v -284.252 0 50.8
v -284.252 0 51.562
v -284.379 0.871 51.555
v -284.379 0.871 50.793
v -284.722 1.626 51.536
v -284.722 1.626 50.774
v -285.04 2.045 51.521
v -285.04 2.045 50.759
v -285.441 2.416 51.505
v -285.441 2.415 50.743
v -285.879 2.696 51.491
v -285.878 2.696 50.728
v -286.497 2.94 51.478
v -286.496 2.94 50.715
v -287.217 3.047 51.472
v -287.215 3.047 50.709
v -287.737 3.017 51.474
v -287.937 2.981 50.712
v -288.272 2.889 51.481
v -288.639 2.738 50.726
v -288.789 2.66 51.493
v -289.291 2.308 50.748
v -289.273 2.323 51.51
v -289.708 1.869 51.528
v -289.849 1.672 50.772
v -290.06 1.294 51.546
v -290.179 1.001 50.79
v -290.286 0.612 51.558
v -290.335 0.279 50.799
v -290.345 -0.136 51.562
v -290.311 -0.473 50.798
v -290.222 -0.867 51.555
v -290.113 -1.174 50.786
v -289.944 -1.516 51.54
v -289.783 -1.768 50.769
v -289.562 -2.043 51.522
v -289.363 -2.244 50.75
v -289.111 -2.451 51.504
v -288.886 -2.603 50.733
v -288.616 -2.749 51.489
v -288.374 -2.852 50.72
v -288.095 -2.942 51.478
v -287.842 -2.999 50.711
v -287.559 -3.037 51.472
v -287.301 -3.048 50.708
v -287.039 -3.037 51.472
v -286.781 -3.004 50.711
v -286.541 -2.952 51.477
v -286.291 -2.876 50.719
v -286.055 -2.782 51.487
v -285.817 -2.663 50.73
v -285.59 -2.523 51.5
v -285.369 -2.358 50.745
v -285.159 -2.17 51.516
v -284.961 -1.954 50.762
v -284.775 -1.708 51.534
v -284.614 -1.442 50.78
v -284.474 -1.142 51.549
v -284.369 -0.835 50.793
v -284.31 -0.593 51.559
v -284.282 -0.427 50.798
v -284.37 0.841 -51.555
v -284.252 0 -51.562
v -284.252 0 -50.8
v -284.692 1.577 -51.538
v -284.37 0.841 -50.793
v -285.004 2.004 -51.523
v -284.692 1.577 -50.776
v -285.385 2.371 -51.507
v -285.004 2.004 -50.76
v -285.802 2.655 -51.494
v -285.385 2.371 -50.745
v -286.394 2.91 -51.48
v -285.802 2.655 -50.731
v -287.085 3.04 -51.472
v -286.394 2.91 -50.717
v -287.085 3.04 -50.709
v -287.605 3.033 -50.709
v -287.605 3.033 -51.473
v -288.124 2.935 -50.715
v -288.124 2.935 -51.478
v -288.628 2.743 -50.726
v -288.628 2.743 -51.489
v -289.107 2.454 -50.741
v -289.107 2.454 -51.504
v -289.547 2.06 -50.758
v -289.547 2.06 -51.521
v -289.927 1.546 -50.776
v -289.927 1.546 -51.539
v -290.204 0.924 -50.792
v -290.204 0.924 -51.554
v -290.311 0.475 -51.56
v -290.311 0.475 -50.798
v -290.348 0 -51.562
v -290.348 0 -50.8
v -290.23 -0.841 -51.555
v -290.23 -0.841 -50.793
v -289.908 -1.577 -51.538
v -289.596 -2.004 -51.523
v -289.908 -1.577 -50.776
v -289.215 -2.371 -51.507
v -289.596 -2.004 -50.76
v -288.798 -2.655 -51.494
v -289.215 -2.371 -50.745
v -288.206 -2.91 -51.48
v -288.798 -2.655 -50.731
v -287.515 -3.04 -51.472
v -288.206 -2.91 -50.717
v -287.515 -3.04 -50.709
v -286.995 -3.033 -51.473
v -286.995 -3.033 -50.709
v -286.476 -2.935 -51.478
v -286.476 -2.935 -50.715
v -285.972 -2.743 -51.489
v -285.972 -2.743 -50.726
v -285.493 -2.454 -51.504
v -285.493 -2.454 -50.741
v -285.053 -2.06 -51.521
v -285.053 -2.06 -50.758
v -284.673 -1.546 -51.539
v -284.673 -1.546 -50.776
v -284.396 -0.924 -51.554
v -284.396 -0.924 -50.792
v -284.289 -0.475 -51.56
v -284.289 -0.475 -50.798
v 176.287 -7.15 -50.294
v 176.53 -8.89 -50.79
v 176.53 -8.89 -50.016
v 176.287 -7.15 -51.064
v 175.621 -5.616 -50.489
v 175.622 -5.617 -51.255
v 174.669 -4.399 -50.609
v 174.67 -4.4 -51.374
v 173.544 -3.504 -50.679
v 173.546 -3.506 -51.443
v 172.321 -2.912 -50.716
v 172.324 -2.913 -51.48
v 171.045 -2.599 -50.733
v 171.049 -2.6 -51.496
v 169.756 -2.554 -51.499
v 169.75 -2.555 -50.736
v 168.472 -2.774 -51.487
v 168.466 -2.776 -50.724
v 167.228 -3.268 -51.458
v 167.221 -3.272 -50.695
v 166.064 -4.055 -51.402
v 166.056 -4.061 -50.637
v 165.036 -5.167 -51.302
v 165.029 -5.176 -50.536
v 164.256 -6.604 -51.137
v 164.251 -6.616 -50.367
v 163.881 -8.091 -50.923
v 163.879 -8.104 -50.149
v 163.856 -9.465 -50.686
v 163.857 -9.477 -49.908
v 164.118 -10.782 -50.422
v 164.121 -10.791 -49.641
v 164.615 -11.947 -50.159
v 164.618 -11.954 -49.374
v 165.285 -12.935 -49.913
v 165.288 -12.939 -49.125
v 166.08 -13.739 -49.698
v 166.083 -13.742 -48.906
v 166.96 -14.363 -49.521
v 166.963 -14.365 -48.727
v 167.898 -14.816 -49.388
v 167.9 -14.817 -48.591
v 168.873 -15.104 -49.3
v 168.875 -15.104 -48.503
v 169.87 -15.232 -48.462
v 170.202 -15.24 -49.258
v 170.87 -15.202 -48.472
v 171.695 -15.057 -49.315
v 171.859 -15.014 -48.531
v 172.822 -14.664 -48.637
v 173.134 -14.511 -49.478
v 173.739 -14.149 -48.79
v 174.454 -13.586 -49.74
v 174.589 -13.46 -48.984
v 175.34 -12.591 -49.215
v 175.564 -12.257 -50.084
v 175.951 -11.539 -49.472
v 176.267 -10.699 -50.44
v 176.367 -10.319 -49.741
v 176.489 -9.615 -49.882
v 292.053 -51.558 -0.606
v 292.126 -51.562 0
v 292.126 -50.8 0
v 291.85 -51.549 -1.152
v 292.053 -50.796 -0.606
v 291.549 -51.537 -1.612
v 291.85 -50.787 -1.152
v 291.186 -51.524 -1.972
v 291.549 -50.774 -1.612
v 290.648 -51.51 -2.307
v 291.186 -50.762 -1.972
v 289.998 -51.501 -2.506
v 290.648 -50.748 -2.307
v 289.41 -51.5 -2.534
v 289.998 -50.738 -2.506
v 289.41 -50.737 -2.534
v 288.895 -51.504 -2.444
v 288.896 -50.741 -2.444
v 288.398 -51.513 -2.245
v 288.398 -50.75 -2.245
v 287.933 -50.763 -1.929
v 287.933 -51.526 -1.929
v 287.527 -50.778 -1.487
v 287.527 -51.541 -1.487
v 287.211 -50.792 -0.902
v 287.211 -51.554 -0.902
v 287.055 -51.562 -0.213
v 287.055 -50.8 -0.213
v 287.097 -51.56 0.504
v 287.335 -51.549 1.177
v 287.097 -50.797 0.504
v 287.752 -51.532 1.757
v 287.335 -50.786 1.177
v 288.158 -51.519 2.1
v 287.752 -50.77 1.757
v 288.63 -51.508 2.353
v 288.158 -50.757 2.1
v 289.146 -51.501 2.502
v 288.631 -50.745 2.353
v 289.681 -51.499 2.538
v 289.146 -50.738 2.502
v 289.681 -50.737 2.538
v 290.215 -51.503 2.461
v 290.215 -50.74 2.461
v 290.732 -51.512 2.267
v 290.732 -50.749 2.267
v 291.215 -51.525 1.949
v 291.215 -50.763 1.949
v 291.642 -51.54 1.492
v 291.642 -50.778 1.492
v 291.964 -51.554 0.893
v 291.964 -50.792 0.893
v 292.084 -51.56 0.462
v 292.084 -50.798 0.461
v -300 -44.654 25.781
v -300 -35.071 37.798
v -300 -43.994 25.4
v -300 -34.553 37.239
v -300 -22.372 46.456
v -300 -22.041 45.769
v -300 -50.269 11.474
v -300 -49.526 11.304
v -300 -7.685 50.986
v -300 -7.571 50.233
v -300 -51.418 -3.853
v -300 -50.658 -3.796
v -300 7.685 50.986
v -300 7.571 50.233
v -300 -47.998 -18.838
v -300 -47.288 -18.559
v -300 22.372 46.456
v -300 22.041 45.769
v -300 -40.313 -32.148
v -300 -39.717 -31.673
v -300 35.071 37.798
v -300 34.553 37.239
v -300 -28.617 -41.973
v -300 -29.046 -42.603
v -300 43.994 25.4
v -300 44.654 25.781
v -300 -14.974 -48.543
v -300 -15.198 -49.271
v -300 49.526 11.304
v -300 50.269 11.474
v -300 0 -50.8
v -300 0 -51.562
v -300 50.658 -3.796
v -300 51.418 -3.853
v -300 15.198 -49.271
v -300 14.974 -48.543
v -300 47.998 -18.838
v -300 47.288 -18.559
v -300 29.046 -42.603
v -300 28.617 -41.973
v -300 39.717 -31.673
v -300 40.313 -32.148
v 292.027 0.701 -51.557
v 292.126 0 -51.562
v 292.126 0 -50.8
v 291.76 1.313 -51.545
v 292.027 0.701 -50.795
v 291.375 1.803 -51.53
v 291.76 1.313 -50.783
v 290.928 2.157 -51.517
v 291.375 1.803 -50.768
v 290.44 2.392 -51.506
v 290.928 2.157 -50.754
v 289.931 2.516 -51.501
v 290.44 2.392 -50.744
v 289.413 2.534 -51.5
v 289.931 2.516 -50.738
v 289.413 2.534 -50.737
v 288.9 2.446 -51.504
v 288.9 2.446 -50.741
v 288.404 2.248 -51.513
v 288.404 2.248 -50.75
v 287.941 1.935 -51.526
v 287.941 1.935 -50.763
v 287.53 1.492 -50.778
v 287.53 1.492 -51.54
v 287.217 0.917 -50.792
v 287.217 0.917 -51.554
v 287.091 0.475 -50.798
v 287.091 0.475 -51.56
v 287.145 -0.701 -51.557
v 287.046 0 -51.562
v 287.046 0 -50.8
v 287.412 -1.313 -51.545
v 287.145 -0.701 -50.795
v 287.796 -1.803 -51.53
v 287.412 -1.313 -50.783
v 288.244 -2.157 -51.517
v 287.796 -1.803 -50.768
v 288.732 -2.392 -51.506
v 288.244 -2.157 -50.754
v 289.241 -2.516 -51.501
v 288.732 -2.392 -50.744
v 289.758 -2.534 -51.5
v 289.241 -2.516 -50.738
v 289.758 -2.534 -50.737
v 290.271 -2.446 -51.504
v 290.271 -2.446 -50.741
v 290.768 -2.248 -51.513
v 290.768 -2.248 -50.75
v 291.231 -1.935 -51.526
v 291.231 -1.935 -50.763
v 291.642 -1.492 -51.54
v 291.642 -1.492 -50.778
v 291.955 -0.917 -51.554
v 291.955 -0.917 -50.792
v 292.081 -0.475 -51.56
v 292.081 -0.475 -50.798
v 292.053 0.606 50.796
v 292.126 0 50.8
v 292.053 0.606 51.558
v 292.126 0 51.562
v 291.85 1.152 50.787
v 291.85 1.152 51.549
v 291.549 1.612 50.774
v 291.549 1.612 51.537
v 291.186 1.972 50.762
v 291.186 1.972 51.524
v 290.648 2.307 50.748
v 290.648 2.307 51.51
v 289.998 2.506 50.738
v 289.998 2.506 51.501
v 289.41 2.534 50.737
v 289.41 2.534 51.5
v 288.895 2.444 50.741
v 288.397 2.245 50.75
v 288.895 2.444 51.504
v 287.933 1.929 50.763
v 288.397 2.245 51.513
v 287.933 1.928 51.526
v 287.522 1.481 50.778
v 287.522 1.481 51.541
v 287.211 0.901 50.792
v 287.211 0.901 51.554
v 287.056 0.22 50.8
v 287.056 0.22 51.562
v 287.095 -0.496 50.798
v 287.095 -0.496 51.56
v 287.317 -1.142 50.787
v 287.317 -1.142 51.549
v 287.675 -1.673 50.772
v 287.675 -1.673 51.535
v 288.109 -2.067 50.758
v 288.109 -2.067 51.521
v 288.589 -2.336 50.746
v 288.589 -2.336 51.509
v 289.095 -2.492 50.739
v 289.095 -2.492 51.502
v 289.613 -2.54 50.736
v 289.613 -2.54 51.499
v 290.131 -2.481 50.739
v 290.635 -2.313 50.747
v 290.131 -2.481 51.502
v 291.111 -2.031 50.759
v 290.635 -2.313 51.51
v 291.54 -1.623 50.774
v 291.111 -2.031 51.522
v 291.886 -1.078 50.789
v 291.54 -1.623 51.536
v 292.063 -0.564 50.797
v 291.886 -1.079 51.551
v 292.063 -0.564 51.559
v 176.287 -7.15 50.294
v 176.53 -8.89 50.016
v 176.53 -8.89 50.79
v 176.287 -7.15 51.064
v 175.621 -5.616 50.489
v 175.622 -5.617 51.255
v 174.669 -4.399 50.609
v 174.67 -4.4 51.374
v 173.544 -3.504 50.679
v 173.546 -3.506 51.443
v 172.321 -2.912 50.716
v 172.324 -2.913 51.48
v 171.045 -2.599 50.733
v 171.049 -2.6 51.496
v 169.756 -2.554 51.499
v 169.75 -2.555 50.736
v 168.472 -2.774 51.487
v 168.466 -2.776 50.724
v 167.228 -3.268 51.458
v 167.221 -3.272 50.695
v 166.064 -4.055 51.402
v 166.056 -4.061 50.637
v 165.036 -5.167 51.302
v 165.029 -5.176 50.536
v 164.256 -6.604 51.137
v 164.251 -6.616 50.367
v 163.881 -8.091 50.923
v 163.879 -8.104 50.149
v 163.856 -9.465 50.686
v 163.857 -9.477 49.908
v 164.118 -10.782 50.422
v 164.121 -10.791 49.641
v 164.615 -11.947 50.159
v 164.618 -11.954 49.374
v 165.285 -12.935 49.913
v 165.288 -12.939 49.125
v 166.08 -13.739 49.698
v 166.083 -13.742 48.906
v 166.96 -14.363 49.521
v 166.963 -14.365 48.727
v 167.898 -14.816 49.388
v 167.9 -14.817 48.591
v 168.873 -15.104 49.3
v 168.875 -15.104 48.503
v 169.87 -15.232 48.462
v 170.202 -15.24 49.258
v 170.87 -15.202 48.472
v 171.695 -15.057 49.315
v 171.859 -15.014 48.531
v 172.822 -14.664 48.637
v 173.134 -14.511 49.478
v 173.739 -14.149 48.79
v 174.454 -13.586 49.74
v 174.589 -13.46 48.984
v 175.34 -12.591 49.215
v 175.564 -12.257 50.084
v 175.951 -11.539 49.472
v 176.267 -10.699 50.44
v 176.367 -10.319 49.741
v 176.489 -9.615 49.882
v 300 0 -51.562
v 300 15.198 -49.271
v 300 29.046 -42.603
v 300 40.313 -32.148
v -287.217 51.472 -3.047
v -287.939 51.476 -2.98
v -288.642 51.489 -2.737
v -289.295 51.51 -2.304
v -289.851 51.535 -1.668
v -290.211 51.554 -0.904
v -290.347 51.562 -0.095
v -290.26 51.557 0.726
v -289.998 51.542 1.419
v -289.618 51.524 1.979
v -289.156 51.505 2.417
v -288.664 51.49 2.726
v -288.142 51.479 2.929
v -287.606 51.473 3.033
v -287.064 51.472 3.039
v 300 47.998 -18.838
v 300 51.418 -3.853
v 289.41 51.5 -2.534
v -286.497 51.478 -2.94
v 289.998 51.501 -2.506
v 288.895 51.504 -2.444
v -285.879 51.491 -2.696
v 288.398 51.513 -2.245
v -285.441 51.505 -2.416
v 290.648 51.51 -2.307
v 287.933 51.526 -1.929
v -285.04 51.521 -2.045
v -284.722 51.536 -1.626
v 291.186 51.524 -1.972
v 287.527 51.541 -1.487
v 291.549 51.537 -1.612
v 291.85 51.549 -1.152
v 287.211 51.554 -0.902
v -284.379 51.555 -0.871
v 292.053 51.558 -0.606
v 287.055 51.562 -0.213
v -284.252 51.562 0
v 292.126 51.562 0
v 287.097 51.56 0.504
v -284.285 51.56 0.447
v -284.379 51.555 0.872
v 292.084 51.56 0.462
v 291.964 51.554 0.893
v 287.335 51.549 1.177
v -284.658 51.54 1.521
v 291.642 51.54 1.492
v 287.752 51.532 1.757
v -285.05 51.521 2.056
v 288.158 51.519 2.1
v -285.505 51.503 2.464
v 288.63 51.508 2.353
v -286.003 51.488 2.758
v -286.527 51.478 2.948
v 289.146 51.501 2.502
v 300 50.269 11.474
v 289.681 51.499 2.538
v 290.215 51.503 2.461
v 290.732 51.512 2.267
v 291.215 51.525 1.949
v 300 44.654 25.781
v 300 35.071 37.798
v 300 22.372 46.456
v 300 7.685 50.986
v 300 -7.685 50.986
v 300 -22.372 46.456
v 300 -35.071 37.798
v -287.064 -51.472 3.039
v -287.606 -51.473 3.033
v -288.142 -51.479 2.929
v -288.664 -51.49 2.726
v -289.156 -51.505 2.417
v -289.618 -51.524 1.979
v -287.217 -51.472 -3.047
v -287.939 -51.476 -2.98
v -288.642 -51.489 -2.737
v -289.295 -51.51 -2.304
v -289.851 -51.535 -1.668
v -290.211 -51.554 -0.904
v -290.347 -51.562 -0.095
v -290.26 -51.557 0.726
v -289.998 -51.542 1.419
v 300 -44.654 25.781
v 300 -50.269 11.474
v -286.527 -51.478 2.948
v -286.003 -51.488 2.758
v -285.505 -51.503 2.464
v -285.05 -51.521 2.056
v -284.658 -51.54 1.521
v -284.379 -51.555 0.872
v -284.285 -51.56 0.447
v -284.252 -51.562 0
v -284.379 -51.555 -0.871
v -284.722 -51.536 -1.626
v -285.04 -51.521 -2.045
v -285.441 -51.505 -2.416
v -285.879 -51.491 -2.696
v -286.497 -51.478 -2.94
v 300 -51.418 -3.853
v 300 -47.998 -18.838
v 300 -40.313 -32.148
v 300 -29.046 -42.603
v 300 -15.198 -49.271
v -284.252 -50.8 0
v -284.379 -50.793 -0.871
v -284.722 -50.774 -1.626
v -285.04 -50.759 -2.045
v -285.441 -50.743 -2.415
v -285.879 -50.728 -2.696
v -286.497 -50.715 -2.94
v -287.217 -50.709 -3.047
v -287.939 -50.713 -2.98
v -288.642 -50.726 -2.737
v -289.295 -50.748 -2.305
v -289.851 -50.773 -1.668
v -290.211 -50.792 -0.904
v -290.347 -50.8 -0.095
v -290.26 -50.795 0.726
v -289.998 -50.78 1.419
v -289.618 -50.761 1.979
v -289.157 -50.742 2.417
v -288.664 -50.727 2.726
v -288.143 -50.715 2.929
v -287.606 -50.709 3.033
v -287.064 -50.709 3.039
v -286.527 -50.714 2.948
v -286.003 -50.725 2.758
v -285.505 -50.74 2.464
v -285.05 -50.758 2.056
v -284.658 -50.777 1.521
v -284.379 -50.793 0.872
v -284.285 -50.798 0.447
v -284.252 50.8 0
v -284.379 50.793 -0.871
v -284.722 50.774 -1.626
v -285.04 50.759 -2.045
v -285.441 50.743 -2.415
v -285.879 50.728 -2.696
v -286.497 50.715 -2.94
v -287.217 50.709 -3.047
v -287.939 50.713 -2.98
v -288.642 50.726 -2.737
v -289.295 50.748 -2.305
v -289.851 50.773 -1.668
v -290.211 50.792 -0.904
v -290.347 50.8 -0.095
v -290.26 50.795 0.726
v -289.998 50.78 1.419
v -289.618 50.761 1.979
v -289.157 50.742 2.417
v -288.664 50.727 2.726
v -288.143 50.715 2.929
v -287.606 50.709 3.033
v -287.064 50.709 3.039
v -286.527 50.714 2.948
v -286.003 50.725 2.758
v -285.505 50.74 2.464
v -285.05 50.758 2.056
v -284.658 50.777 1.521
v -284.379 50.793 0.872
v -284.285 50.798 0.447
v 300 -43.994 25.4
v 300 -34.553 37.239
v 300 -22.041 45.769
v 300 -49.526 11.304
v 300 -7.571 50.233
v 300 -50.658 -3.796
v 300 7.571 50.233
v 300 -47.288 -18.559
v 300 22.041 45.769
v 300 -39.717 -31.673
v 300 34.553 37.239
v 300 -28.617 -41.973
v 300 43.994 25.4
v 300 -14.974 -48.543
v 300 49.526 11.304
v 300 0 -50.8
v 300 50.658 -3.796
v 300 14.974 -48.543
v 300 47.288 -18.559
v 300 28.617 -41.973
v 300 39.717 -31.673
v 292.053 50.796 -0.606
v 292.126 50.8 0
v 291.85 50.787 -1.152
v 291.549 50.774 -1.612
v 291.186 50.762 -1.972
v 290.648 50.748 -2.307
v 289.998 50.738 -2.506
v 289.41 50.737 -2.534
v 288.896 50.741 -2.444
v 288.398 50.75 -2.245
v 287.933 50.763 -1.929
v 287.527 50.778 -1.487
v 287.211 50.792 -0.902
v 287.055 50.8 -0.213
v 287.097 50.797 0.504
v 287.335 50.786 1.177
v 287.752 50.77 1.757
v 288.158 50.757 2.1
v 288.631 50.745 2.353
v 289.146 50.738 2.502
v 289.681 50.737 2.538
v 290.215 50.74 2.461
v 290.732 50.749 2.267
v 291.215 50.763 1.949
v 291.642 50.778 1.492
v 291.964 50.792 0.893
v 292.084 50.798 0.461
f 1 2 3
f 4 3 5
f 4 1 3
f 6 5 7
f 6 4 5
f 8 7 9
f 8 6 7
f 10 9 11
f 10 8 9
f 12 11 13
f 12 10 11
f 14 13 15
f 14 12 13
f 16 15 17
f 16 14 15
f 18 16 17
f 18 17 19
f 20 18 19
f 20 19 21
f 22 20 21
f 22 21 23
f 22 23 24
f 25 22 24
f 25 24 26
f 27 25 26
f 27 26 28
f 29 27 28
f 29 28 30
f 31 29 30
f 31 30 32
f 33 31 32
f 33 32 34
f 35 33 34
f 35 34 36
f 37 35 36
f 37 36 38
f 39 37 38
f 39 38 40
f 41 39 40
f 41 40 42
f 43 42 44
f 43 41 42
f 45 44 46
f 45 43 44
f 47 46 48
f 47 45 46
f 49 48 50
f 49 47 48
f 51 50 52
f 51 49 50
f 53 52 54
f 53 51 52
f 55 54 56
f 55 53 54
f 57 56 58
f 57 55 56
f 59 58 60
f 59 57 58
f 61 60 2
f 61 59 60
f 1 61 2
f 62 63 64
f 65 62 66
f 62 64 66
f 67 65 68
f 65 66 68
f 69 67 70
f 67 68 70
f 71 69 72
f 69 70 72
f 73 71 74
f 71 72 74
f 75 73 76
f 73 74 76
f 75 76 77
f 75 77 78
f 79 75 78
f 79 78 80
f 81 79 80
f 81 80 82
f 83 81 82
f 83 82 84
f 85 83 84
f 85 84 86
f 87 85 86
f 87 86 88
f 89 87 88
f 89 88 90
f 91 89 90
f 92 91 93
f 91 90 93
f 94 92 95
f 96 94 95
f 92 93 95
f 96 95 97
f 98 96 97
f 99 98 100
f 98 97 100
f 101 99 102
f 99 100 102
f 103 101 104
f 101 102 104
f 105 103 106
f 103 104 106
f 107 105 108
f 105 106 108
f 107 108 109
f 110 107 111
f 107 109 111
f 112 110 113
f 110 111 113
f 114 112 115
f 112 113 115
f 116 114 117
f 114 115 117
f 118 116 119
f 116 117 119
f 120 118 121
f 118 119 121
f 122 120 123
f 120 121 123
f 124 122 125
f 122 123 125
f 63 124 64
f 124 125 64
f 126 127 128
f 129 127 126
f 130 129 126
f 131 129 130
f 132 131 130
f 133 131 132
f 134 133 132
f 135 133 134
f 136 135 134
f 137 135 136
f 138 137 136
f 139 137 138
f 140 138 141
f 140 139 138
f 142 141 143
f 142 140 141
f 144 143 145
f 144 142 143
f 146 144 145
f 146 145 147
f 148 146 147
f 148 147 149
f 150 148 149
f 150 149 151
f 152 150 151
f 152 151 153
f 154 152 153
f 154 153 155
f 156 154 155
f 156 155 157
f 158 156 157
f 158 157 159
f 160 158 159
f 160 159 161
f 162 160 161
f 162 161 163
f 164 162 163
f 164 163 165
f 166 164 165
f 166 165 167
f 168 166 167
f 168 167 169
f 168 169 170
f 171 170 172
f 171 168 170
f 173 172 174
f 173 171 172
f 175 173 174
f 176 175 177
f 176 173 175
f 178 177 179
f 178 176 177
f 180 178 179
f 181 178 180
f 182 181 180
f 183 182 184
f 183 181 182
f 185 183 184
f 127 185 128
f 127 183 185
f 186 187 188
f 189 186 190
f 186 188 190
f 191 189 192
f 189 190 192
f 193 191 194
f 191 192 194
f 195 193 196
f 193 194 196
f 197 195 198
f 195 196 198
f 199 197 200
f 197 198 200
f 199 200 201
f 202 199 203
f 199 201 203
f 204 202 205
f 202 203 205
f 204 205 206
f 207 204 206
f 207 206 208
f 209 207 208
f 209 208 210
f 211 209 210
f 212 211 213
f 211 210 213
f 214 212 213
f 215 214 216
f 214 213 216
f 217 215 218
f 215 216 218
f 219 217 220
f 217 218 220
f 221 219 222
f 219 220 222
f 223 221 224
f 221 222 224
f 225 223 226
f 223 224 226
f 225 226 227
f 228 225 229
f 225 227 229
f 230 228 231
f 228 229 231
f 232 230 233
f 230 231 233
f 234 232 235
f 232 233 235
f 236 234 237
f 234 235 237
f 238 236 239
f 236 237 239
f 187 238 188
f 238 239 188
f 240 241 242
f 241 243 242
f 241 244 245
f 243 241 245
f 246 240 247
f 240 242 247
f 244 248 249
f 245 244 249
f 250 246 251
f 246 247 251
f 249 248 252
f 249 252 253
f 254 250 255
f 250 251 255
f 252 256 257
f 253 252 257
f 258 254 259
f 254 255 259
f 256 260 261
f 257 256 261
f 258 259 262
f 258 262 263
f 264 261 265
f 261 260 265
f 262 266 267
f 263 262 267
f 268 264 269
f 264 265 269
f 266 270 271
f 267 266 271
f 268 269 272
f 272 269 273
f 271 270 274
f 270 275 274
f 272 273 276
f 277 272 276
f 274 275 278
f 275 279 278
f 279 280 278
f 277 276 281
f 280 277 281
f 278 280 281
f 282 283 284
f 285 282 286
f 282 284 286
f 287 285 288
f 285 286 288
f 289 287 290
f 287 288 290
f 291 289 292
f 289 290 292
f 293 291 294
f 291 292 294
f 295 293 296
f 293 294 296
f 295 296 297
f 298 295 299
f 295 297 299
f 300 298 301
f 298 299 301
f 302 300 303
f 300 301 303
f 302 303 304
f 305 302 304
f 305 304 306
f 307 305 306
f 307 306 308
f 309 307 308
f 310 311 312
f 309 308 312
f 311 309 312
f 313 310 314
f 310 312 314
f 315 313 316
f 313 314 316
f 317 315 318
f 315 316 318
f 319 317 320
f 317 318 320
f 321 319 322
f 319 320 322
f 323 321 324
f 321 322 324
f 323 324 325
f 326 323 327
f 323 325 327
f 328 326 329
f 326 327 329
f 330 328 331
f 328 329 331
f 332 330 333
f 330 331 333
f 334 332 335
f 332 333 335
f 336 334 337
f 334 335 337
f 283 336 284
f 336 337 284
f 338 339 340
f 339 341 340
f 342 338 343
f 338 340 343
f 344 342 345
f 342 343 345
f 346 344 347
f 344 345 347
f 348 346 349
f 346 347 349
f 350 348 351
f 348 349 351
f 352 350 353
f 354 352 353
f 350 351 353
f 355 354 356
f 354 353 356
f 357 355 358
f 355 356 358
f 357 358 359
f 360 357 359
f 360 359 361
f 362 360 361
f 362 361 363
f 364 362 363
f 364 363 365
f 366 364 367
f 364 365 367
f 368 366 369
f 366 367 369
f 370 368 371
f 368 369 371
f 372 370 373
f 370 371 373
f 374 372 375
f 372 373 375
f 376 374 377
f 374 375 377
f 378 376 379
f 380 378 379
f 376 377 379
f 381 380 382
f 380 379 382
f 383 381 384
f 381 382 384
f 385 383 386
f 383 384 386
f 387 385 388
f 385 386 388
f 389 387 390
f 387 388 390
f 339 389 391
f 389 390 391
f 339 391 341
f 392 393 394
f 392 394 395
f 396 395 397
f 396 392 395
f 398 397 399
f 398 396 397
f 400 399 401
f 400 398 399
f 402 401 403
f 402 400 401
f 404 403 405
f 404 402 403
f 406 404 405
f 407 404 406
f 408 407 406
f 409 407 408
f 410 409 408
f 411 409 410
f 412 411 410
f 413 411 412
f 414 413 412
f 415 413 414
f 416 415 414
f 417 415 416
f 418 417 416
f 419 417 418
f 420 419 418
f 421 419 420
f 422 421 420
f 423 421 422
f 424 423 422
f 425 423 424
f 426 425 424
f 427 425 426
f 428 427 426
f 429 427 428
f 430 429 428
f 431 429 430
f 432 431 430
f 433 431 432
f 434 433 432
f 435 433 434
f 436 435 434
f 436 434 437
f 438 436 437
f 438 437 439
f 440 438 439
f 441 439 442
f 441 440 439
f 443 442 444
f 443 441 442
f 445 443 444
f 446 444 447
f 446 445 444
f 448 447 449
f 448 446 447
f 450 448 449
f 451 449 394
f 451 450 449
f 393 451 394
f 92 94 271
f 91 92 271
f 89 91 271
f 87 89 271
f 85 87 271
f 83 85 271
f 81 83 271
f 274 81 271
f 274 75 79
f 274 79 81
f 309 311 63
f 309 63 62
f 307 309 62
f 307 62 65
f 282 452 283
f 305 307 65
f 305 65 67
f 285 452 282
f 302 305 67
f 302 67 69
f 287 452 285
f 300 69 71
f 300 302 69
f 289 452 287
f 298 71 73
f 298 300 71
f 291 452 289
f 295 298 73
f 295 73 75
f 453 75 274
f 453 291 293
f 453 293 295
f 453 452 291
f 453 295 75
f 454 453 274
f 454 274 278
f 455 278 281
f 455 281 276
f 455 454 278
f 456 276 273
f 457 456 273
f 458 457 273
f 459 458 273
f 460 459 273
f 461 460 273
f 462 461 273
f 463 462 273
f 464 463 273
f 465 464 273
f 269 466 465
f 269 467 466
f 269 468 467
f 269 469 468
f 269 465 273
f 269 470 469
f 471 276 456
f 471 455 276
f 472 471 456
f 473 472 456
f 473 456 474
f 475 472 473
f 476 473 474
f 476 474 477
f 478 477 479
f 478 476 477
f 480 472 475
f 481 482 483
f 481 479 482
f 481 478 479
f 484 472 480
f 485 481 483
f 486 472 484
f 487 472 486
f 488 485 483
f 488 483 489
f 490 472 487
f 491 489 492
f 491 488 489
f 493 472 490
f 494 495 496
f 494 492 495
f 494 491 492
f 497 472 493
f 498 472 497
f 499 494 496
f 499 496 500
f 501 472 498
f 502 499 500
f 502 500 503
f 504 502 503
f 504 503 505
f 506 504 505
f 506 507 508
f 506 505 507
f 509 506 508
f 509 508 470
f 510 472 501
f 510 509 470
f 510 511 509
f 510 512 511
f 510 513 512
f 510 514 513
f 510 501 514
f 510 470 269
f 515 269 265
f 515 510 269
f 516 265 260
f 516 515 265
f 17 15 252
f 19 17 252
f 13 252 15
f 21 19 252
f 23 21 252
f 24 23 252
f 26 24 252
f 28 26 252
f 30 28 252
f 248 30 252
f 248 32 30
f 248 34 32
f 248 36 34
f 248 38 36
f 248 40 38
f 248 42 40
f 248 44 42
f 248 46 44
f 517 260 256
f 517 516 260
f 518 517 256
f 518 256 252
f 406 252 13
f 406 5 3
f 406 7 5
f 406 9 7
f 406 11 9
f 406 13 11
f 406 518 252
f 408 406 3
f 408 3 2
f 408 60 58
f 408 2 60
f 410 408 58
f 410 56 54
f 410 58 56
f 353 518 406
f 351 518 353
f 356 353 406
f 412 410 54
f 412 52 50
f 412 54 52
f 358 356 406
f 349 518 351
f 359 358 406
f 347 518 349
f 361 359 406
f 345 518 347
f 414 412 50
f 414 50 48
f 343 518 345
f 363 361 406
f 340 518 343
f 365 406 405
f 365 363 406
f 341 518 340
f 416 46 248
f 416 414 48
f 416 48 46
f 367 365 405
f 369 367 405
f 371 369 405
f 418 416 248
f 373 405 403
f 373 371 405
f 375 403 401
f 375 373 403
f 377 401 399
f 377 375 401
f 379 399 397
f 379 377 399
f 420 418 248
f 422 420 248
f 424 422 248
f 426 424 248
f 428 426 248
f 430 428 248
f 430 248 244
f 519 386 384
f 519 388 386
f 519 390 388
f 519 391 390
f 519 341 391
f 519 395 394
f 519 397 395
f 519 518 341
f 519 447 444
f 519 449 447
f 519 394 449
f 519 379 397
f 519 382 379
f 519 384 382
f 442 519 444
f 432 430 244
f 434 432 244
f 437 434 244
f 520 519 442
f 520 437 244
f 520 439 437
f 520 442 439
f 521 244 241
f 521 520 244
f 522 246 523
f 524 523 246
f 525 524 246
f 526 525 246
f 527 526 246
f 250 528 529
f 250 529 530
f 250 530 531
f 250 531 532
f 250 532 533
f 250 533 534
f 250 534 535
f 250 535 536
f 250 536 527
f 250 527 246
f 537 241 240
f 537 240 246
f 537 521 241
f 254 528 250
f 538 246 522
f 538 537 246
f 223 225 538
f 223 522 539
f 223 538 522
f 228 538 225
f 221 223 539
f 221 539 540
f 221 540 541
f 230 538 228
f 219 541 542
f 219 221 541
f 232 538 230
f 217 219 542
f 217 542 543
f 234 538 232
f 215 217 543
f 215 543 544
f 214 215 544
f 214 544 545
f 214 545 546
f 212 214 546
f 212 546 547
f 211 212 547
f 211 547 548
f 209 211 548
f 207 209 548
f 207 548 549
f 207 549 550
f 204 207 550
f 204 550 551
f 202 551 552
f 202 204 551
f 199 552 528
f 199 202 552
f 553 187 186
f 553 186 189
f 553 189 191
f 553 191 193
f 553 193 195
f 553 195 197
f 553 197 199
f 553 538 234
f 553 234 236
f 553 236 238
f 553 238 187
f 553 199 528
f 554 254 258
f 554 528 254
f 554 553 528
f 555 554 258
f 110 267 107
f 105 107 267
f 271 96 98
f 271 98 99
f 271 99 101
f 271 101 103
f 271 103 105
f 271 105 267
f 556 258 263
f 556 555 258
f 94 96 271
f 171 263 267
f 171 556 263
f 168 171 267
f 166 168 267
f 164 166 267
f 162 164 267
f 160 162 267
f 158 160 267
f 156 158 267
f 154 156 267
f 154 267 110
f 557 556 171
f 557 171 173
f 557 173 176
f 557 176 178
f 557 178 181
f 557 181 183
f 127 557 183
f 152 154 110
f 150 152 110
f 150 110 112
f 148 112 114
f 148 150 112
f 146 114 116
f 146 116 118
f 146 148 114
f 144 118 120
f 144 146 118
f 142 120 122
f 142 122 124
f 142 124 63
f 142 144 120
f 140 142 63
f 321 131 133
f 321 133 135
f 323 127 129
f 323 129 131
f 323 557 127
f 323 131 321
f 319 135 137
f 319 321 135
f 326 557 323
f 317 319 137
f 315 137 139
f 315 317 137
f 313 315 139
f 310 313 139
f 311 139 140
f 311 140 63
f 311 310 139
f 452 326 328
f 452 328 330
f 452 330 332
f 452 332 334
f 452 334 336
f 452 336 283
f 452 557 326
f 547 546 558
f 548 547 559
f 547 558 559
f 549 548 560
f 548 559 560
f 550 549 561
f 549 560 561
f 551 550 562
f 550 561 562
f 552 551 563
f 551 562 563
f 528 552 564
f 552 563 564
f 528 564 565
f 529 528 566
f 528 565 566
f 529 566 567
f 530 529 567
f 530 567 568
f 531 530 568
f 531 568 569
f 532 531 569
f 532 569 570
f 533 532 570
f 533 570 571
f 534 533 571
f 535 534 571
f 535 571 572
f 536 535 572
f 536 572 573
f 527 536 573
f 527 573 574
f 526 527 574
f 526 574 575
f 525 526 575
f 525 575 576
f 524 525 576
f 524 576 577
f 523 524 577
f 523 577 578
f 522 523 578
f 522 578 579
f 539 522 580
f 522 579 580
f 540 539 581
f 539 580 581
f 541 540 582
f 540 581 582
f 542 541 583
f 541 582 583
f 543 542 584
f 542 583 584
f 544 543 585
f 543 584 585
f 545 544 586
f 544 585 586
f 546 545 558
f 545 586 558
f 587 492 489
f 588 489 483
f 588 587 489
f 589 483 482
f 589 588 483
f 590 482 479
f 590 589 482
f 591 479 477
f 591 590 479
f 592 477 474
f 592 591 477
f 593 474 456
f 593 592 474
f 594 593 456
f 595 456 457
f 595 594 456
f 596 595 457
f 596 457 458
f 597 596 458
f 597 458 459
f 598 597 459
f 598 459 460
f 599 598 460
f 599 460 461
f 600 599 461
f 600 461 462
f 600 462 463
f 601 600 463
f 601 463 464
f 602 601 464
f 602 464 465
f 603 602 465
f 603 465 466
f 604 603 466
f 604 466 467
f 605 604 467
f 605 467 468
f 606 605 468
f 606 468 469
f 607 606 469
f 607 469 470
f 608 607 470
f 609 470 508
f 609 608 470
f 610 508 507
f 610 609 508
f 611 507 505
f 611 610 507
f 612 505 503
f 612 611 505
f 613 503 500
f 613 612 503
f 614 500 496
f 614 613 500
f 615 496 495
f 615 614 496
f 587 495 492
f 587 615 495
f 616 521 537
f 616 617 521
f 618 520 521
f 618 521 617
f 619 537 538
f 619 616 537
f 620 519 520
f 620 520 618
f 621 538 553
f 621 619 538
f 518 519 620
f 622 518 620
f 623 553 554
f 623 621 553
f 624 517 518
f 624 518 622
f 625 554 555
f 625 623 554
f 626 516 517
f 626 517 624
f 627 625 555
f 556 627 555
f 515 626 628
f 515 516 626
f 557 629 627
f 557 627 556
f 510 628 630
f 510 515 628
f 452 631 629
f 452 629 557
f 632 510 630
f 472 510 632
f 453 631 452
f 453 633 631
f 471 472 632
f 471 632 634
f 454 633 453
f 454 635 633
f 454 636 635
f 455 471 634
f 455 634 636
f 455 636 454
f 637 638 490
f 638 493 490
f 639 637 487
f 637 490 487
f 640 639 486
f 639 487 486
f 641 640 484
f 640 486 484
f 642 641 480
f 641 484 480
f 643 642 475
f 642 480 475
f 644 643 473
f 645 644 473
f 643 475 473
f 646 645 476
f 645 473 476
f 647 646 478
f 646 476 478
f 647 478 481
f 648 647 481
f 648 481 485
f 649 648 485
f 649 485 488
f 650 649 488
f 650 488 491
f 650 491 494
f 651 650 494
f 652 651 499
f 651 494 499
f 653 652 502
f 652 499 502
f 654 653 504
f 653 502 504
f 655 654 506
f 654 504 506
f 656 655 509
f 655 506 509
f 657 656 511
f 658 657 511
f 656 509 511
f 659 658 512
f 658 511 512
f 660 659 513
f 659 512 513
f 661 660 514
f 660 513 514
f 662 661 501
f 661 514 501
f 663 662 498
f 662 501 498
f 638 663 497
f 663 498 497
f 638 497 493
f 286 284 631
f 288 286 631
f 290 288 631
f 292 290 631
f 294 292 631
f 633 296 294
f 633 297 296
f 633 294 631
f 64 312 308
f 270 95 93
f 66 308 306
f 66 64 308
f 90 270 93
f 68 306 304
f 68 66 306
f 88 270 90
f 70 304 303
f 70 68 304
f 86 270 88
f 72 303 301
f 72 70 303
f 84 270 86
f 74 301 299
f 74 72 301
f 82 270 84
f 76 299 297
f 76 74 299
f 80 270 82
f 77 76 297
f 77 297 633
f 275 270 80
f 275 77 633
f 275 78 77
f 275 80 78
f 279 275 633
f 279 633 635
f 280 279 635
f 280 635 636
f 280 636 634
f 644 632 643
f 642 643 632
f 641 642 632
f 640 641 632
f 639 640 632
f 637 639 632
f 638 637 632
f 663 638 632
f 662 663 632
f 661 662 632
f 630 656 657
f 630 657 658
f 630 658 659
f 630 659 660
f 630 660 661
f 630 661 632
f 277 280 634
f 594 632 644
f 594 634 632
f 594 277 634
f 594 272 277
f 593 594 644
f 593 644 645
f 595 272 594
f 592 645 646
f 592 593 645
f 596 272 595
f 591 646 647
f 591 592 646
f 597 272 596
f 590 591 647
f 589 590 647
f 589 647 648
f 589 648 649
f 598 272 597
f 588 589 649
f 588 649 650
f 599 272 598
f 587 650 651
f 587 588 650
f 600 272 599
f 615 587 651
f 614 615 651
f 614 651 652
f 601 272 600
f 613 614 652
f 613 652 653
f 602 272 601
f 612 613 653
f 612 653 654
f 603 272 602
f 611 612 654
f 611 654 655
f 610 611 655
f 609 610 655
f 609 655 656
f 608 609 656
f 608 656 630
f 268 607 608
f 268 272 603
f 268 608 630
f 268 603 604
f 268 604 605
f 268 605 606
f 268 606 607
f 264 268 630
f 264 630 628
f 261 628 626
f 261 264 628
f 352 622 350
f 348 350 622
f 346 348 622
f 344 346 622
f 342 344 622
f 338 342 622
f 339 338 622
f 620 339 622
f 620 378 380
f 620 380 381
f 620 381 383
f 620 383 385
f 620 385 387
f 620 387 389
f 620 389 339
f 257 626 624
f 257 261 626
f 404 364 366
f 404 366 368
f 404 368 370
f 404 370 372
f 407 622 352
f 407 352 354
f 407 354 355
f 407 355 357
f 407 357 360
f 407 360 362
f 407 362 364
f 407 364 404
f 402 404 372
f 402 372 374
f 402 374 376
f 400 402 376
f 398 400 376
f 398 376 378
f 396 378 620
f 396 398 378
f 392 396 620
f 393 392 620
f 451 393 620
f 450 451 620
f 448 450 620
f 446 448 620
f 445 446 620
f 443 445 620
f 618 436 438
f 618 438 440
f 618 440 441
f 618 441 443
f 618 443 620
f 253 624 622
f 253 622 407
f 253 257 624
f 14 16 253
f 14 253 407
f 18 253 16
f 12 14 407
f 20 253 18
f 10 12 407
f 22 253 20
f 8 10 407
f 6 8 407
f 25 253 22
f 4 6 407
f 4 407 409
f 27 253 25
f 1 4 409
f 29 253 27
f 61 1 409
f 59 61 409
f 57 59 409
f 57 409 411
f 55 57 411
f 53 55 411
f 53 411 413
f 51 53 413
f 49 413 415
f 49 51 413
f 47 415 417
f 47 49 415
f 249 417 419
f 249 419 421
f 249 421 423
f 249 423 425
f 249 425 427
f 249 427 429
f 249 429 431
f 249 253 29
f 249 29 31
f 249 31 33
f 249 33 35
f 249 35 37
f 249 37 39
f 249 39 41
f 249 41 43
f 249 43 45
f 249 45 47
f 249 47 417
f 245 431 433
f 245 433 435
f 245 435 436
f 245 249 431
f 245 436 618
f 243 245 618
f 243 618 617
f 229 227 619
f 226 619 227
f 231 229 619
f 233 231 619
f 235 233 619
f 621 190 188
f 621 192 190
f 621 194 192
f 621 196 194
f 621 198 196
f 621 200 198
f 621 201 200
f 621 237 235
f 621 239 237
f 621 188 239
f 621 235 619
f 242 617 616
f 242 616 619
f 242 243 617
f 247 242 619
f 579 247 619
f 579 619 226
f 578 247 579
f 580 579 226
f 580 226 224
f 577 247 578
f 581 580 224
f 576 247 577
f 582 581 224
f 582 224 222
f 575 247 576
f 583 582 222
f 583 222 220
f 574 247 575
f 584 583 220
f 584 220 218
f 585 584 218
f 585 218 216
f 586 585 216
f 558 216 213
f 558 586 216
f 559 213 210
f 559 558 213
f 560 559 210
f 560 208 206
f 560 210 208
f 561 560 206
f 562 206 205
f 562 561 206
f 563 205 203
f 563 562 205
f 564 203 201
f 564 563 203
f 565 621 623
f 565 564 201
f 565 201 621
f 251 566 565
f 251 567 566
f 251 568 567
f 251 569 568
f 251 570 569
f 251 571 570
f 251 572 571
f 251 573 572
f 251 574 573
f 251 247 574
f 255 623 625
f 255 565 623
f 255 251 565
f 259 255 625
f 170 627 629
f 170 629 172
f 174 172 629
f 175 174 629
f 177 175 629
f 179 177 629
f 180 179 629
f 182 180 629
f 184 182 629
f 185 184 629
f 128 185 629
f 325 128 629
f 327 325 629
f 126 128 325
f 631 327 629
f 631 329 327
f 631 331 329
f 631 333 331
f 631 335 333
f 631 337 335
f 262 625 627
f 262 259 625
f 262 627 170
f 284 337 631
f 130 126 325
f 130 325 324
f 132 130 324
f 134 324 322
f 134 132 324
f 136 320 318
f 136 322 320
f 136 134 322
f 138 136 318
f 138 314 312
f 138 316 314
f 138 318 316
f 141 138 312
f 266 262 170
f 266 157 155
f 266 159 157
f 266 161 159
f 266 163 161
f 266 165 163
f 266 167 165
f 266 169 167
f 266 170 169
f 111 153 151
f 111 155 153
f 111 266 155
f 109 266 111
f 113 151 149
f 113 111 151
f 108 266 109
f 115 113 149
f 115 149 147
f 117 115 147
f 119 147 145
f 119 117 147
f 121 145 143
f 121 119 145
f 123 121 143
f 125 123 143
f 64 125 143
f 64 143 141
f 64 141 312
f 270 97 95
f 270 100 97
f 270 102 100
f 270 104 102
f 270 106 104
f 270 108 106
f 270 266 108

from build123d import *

# Parameters (mm, degrees)
SKETCH1_R               = 51.562
SKETCH1_R_2             = 50.8
BOSS_EXTRUDE1_DEPTH     = 300
CUT_EXTRUDE1_DEPTH      = 309.73496674
CUT_EXTRUDE1_DEPTH_BACK = 309.73496674
SKETCH3_R               = 6.35
SKETCH4_R               = 3.048
SKETCH4_R_2             = 2.54
CUT_EXTRUDE2_DEPTH      = 309.734966871
CIRPATTERN1_COUNT       = 2
CIRPATTERN1_ANGLE       = 90


with BuildPart() as part:
    # Sketch1 → Boss-Extrude1 (new, symmetric)
    with BuildSketch(Plane(origin=(0, 0, 0), x_dir=(0, 0, -1), z_dir=(1, 0, 0))):
        Circle(SKETCH1_R)
        Circle(SKETCH1_R_2, mode=Mode.SUBTRACT)
    extrude(amount=BOSS_EXTRUDE1_DEPTH, both=True)

    # Sketch3 → Cut-Extrude1 (cut, two sides: drawn at the far end of the back side and taken through both)
    with BuildSketch(Plane.XY.offset(-CUT_EXTRUDE1_DEPTH_BACK)):
        with Locations((170.180000052, -8.89)):
            Circle(SKETCH3_R)
    extrude(amount=CUT_EXTRUDE1_DEPTH + CUT_EXTRUDE1_DEPTH_BACK, mode=Mode.SUBTRACT)

    # Sketch4 → Cut-Extrude2 (cut, symmetric)
    with BuildSketch(Plane.XY):
        with Locations((-287.3, 0)):
            Circle(SKETCH4_R)
        with Locations((289.586, 0)):
            Circle(SKETCH4_R_2)
    cut_extrude2 = extrude(amount=CUT_EXTRUDE2_DEPTH, both=True, mode=Mode.SUBTRACT)

    # CirPattern1: Cut-Extrude2 ×2 about axis
    cirpattern1_axis = Axis((300, 0, 0), (-1, 0, 0))
    for i in range(1, CIRPATTERN1_COUNT):
        add(cut_extrude2.rotate(cirpattern1_axis, i * CIRPATTERN1_ANGLE / (CIRPATTERN1_COUNT - 1)), mode=Mode.SUBTRACT)


solid = part.part
